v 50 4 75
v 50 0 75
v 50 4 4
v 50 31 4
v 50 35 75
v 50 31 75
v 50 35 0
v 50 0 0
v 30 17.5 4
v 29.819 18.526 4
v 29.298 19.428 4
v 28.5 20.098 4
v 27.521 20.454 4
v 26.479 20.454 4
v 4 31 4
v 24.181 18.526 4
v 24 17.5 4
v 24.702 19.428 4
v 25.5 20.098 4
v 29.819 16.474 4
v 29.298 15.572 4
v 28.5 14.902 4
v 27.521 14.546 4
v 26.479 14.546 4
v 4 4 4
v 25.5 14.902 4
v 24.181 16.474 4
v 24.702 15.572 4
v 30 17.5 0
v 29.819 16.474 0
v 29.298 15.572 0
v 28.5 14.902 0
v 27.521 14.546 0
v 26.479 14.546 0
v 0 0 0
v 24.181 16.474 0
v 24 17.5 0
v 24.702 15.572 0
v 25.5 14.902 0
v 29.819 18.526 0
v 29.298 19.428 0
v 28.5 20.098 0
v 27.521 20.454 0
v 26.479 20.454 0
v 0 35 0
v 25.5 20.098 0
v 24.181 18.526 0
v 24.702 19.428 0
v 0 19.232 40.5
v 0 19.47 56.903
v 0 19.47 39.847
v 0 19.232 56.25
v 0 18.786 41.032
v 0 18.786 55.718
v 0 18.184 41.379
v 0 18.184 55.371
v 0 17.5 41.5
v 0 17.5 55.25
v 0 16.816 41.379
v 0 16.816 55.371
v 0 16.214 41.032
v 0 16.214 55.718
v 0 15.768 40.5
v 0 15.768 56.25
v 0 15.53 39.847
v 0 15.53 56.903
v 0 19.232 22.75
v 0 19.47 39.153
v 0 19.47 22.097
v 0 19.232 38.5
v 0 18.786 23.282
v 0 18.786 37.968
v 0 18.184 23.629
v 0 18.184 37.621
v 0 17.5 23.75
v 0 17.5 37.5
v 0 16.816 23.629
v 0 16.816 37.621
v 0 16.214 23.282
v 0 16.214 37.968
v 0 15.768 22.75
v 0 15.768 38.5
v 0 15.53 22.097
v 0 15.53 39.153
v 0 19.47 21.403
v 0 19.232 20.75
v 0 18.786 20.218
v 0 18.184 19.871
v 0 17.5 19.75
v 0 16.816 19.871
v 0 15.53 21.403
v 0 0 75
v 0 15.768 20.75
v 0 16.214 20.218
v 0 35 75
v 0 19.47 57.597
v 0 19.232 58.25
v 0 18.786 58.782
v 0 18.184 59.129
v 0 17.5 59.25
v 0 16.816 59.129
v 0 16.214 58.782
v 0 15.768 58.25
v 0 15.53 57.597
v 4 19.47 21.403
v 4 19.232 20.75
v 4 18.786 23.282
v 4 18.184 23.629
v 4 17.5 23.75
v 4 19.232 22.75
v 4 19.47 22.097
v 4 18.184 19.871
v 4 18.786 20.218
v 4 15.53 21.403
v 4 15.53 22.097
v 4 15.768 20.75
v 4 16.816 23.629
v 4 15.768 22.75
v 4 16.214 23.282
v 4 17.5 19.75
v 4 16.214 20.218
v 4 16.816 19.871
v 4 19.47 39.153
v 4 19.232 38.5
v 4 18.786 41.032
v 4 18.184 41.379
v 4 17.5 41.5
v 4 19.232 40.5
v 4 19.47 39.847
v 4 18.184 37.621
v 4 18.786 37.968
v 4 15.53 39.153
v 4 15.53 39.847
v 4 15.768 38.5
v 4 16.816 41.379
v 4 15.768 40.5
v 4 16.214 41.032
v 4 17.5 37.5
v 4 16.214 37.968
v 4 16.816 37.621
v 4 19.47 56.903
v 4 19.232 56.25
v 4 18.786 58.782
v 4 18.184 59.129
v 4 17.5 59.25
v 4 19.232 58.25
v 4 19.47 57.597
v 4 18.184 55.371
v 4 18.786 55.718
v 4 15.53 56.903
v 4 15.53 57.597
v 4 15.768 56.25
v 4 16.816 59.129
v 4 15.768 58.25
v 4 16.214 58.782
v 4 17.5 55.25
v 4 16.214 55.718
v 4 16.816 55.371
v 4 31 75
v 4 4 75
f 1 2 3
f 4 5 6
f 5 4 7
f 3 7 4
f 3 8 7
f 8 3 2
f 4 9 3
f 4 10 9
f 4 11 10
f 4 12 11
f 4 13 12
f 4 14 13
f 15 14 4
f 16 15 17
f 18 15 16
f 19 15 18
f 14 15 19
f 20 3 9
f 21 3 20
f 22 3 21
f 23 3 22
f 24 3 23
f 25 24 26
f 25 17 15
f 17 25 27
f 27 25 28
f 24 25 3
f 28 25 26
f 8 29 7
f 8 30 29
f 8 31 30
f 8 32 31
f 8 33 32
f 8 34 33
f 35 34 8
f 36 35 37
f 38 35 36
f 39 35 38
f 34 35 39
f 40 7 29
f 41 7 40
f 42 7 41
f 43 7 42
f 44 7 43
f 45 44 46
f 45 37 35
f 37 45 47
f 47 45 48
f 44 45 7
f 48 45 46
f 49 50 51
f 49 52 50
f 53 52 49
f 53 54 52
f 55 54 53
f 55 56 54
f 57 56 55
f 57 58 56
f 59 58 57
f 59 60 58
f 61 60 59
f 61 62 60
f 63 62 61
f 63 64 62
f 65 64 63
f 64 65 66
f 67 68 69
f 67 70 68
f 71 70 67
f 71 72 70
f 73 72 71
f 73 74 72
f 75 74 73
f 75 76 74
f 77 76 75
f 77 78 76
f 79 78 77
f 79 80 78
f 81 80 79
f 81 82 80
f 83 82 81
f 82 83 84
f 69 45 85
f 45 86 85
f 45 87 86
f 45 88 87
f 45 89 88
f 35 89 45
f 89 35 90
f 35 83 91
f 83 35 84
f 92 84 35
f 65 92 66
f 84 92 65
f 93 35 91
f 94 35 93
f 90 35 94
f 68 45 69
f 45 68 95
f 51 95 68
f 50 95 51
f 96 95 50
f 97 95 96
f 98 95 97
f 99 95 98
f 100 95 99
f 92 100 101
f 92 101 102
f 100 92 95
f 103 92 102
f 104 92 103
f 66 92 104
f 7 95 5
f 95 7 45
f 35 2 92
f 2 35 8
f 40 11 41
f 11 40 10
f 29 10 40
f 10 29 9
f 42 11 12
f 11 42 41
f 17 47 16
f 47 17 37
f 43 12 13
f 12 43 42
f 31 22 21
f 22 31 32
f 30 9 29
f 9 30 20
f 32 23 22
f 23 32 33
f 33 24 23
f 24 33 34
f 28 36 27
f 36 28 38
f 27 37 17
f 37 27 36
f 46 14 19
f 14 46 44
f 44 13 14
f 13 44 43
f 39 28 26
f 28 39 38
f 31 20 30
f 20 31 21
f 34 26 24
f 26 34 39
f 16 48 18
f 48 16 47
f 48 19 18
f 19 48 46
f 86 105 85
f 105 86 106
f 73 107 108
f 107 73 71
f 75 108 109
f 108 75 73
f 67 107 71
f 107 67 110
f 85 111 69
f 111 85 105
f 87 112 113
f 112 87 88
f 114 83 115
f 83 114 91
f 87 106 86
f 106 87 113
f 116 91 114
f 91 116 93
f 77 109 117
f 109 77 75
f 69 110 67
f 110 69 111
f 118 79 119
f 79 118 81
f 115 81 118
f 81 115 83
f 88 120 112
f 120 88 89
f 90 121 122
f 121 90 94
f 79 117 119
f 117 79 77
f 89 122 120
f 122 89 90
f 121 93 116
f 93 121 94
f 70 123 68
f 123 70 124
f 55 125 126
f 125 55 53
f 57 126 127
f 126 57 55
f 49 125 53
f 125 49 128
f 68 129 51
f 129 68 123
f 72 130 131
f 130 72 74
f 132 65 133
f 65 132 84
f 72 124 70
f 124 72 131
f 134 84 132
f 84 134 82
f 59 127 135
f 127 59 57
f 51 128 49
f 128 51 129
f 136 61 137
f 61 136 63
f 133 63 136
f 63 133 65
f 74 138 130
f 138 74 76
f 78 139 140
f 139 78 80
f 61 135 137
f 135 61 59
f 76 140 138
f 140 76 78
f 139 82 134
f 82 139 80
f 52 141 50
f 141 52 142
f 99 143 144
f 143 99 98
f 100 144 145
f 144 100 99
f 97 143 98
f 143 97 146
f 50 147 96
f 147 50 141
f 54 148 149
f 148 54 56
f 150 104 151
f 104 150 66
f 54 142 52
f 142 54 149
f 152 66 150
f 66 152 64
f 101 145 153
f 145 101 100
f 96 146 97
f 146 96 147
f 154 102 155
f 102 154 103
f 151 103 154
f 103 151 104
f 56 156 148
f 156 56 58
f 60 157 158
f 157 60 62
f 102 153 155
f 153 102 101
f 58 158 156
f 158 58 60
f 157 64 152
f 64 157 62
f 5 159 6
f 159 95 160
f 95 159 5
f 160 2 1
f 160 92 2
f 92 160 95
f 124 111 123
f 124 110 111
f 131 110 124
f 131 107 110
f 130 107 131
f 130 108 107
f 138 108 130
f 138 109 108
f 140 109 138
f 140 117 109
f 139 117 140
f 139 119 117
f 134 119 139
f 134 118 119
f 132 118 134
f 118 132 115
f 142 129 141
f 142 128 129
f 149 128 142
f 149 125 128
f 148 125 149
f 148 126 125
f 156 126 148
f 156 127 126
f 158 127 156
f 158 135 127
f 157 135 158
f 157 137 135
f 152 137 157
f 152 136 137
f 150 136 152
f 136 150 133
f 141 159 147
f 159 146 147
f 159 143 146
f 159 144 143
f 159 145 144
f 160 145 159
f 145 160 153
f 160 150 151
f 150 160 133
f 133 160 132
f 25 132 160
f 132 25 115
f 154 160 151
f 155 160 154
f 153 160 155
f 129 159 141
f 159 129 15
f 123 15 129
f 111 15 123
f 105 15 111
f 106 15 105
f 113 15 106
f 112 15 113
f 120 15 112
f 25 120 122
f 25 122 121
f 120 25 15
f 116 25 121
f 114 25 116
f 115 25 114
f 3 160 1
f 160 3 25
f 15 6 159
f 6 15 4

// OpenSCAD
/*
    module shelf_bracket
    
    parameters:
    - side_a    is a vector [length, hole diameter, number of holes]
    - side_b    is a vector [length, hole diameter, number of holes]
    - width     refers to the width of the bracket
    - thickness refers to the material thickness of the bracket
*/

module shelf_bracket( side_a = [50,6,1], side_b = [75,4,3], width = 35, thickness = 4 ) {
    
    module xhole_plate( size, h_dm, h_num, margin ) {
        
        difference() {
        
            cube(size);
            
            h_distance = (size.x - margin) / (h_num + 1);
            
            for (x = [1:h_num])
                translate([
                    margin + x * h_distance,
                    size.y/2,
                    -1])
                cylinder( d = h_dm, h = size.z + 2, $fn=18);
            }
        }
        
        // side A
        xhole_plate(
            [side_a[0], width, thickness],
            side_a[1],
            side_a[2],
            thickness
        );
        
        // side B
        translate([thickness,0,0])
        rotate([0,-90,0])
        xhole_plate(
            [side_b[0], width, thickness],
            side_b[1],
            side_b[2],
            thickness
        );
        
        // stringer
        cube( [side_a[0], thickness, side_b[0]]);
        
        translate( [0, width - thickness, 0] )
            cube( [side_a[0], thickness, side_b[0]]);
        
    }

//shelf_bracket(
//  side_a    = [50, 6, 1],
//  side_b    = [75, 4, 3],
//  width     = 35,
//  thickness = 4
//);
    
shelf_bracket();
